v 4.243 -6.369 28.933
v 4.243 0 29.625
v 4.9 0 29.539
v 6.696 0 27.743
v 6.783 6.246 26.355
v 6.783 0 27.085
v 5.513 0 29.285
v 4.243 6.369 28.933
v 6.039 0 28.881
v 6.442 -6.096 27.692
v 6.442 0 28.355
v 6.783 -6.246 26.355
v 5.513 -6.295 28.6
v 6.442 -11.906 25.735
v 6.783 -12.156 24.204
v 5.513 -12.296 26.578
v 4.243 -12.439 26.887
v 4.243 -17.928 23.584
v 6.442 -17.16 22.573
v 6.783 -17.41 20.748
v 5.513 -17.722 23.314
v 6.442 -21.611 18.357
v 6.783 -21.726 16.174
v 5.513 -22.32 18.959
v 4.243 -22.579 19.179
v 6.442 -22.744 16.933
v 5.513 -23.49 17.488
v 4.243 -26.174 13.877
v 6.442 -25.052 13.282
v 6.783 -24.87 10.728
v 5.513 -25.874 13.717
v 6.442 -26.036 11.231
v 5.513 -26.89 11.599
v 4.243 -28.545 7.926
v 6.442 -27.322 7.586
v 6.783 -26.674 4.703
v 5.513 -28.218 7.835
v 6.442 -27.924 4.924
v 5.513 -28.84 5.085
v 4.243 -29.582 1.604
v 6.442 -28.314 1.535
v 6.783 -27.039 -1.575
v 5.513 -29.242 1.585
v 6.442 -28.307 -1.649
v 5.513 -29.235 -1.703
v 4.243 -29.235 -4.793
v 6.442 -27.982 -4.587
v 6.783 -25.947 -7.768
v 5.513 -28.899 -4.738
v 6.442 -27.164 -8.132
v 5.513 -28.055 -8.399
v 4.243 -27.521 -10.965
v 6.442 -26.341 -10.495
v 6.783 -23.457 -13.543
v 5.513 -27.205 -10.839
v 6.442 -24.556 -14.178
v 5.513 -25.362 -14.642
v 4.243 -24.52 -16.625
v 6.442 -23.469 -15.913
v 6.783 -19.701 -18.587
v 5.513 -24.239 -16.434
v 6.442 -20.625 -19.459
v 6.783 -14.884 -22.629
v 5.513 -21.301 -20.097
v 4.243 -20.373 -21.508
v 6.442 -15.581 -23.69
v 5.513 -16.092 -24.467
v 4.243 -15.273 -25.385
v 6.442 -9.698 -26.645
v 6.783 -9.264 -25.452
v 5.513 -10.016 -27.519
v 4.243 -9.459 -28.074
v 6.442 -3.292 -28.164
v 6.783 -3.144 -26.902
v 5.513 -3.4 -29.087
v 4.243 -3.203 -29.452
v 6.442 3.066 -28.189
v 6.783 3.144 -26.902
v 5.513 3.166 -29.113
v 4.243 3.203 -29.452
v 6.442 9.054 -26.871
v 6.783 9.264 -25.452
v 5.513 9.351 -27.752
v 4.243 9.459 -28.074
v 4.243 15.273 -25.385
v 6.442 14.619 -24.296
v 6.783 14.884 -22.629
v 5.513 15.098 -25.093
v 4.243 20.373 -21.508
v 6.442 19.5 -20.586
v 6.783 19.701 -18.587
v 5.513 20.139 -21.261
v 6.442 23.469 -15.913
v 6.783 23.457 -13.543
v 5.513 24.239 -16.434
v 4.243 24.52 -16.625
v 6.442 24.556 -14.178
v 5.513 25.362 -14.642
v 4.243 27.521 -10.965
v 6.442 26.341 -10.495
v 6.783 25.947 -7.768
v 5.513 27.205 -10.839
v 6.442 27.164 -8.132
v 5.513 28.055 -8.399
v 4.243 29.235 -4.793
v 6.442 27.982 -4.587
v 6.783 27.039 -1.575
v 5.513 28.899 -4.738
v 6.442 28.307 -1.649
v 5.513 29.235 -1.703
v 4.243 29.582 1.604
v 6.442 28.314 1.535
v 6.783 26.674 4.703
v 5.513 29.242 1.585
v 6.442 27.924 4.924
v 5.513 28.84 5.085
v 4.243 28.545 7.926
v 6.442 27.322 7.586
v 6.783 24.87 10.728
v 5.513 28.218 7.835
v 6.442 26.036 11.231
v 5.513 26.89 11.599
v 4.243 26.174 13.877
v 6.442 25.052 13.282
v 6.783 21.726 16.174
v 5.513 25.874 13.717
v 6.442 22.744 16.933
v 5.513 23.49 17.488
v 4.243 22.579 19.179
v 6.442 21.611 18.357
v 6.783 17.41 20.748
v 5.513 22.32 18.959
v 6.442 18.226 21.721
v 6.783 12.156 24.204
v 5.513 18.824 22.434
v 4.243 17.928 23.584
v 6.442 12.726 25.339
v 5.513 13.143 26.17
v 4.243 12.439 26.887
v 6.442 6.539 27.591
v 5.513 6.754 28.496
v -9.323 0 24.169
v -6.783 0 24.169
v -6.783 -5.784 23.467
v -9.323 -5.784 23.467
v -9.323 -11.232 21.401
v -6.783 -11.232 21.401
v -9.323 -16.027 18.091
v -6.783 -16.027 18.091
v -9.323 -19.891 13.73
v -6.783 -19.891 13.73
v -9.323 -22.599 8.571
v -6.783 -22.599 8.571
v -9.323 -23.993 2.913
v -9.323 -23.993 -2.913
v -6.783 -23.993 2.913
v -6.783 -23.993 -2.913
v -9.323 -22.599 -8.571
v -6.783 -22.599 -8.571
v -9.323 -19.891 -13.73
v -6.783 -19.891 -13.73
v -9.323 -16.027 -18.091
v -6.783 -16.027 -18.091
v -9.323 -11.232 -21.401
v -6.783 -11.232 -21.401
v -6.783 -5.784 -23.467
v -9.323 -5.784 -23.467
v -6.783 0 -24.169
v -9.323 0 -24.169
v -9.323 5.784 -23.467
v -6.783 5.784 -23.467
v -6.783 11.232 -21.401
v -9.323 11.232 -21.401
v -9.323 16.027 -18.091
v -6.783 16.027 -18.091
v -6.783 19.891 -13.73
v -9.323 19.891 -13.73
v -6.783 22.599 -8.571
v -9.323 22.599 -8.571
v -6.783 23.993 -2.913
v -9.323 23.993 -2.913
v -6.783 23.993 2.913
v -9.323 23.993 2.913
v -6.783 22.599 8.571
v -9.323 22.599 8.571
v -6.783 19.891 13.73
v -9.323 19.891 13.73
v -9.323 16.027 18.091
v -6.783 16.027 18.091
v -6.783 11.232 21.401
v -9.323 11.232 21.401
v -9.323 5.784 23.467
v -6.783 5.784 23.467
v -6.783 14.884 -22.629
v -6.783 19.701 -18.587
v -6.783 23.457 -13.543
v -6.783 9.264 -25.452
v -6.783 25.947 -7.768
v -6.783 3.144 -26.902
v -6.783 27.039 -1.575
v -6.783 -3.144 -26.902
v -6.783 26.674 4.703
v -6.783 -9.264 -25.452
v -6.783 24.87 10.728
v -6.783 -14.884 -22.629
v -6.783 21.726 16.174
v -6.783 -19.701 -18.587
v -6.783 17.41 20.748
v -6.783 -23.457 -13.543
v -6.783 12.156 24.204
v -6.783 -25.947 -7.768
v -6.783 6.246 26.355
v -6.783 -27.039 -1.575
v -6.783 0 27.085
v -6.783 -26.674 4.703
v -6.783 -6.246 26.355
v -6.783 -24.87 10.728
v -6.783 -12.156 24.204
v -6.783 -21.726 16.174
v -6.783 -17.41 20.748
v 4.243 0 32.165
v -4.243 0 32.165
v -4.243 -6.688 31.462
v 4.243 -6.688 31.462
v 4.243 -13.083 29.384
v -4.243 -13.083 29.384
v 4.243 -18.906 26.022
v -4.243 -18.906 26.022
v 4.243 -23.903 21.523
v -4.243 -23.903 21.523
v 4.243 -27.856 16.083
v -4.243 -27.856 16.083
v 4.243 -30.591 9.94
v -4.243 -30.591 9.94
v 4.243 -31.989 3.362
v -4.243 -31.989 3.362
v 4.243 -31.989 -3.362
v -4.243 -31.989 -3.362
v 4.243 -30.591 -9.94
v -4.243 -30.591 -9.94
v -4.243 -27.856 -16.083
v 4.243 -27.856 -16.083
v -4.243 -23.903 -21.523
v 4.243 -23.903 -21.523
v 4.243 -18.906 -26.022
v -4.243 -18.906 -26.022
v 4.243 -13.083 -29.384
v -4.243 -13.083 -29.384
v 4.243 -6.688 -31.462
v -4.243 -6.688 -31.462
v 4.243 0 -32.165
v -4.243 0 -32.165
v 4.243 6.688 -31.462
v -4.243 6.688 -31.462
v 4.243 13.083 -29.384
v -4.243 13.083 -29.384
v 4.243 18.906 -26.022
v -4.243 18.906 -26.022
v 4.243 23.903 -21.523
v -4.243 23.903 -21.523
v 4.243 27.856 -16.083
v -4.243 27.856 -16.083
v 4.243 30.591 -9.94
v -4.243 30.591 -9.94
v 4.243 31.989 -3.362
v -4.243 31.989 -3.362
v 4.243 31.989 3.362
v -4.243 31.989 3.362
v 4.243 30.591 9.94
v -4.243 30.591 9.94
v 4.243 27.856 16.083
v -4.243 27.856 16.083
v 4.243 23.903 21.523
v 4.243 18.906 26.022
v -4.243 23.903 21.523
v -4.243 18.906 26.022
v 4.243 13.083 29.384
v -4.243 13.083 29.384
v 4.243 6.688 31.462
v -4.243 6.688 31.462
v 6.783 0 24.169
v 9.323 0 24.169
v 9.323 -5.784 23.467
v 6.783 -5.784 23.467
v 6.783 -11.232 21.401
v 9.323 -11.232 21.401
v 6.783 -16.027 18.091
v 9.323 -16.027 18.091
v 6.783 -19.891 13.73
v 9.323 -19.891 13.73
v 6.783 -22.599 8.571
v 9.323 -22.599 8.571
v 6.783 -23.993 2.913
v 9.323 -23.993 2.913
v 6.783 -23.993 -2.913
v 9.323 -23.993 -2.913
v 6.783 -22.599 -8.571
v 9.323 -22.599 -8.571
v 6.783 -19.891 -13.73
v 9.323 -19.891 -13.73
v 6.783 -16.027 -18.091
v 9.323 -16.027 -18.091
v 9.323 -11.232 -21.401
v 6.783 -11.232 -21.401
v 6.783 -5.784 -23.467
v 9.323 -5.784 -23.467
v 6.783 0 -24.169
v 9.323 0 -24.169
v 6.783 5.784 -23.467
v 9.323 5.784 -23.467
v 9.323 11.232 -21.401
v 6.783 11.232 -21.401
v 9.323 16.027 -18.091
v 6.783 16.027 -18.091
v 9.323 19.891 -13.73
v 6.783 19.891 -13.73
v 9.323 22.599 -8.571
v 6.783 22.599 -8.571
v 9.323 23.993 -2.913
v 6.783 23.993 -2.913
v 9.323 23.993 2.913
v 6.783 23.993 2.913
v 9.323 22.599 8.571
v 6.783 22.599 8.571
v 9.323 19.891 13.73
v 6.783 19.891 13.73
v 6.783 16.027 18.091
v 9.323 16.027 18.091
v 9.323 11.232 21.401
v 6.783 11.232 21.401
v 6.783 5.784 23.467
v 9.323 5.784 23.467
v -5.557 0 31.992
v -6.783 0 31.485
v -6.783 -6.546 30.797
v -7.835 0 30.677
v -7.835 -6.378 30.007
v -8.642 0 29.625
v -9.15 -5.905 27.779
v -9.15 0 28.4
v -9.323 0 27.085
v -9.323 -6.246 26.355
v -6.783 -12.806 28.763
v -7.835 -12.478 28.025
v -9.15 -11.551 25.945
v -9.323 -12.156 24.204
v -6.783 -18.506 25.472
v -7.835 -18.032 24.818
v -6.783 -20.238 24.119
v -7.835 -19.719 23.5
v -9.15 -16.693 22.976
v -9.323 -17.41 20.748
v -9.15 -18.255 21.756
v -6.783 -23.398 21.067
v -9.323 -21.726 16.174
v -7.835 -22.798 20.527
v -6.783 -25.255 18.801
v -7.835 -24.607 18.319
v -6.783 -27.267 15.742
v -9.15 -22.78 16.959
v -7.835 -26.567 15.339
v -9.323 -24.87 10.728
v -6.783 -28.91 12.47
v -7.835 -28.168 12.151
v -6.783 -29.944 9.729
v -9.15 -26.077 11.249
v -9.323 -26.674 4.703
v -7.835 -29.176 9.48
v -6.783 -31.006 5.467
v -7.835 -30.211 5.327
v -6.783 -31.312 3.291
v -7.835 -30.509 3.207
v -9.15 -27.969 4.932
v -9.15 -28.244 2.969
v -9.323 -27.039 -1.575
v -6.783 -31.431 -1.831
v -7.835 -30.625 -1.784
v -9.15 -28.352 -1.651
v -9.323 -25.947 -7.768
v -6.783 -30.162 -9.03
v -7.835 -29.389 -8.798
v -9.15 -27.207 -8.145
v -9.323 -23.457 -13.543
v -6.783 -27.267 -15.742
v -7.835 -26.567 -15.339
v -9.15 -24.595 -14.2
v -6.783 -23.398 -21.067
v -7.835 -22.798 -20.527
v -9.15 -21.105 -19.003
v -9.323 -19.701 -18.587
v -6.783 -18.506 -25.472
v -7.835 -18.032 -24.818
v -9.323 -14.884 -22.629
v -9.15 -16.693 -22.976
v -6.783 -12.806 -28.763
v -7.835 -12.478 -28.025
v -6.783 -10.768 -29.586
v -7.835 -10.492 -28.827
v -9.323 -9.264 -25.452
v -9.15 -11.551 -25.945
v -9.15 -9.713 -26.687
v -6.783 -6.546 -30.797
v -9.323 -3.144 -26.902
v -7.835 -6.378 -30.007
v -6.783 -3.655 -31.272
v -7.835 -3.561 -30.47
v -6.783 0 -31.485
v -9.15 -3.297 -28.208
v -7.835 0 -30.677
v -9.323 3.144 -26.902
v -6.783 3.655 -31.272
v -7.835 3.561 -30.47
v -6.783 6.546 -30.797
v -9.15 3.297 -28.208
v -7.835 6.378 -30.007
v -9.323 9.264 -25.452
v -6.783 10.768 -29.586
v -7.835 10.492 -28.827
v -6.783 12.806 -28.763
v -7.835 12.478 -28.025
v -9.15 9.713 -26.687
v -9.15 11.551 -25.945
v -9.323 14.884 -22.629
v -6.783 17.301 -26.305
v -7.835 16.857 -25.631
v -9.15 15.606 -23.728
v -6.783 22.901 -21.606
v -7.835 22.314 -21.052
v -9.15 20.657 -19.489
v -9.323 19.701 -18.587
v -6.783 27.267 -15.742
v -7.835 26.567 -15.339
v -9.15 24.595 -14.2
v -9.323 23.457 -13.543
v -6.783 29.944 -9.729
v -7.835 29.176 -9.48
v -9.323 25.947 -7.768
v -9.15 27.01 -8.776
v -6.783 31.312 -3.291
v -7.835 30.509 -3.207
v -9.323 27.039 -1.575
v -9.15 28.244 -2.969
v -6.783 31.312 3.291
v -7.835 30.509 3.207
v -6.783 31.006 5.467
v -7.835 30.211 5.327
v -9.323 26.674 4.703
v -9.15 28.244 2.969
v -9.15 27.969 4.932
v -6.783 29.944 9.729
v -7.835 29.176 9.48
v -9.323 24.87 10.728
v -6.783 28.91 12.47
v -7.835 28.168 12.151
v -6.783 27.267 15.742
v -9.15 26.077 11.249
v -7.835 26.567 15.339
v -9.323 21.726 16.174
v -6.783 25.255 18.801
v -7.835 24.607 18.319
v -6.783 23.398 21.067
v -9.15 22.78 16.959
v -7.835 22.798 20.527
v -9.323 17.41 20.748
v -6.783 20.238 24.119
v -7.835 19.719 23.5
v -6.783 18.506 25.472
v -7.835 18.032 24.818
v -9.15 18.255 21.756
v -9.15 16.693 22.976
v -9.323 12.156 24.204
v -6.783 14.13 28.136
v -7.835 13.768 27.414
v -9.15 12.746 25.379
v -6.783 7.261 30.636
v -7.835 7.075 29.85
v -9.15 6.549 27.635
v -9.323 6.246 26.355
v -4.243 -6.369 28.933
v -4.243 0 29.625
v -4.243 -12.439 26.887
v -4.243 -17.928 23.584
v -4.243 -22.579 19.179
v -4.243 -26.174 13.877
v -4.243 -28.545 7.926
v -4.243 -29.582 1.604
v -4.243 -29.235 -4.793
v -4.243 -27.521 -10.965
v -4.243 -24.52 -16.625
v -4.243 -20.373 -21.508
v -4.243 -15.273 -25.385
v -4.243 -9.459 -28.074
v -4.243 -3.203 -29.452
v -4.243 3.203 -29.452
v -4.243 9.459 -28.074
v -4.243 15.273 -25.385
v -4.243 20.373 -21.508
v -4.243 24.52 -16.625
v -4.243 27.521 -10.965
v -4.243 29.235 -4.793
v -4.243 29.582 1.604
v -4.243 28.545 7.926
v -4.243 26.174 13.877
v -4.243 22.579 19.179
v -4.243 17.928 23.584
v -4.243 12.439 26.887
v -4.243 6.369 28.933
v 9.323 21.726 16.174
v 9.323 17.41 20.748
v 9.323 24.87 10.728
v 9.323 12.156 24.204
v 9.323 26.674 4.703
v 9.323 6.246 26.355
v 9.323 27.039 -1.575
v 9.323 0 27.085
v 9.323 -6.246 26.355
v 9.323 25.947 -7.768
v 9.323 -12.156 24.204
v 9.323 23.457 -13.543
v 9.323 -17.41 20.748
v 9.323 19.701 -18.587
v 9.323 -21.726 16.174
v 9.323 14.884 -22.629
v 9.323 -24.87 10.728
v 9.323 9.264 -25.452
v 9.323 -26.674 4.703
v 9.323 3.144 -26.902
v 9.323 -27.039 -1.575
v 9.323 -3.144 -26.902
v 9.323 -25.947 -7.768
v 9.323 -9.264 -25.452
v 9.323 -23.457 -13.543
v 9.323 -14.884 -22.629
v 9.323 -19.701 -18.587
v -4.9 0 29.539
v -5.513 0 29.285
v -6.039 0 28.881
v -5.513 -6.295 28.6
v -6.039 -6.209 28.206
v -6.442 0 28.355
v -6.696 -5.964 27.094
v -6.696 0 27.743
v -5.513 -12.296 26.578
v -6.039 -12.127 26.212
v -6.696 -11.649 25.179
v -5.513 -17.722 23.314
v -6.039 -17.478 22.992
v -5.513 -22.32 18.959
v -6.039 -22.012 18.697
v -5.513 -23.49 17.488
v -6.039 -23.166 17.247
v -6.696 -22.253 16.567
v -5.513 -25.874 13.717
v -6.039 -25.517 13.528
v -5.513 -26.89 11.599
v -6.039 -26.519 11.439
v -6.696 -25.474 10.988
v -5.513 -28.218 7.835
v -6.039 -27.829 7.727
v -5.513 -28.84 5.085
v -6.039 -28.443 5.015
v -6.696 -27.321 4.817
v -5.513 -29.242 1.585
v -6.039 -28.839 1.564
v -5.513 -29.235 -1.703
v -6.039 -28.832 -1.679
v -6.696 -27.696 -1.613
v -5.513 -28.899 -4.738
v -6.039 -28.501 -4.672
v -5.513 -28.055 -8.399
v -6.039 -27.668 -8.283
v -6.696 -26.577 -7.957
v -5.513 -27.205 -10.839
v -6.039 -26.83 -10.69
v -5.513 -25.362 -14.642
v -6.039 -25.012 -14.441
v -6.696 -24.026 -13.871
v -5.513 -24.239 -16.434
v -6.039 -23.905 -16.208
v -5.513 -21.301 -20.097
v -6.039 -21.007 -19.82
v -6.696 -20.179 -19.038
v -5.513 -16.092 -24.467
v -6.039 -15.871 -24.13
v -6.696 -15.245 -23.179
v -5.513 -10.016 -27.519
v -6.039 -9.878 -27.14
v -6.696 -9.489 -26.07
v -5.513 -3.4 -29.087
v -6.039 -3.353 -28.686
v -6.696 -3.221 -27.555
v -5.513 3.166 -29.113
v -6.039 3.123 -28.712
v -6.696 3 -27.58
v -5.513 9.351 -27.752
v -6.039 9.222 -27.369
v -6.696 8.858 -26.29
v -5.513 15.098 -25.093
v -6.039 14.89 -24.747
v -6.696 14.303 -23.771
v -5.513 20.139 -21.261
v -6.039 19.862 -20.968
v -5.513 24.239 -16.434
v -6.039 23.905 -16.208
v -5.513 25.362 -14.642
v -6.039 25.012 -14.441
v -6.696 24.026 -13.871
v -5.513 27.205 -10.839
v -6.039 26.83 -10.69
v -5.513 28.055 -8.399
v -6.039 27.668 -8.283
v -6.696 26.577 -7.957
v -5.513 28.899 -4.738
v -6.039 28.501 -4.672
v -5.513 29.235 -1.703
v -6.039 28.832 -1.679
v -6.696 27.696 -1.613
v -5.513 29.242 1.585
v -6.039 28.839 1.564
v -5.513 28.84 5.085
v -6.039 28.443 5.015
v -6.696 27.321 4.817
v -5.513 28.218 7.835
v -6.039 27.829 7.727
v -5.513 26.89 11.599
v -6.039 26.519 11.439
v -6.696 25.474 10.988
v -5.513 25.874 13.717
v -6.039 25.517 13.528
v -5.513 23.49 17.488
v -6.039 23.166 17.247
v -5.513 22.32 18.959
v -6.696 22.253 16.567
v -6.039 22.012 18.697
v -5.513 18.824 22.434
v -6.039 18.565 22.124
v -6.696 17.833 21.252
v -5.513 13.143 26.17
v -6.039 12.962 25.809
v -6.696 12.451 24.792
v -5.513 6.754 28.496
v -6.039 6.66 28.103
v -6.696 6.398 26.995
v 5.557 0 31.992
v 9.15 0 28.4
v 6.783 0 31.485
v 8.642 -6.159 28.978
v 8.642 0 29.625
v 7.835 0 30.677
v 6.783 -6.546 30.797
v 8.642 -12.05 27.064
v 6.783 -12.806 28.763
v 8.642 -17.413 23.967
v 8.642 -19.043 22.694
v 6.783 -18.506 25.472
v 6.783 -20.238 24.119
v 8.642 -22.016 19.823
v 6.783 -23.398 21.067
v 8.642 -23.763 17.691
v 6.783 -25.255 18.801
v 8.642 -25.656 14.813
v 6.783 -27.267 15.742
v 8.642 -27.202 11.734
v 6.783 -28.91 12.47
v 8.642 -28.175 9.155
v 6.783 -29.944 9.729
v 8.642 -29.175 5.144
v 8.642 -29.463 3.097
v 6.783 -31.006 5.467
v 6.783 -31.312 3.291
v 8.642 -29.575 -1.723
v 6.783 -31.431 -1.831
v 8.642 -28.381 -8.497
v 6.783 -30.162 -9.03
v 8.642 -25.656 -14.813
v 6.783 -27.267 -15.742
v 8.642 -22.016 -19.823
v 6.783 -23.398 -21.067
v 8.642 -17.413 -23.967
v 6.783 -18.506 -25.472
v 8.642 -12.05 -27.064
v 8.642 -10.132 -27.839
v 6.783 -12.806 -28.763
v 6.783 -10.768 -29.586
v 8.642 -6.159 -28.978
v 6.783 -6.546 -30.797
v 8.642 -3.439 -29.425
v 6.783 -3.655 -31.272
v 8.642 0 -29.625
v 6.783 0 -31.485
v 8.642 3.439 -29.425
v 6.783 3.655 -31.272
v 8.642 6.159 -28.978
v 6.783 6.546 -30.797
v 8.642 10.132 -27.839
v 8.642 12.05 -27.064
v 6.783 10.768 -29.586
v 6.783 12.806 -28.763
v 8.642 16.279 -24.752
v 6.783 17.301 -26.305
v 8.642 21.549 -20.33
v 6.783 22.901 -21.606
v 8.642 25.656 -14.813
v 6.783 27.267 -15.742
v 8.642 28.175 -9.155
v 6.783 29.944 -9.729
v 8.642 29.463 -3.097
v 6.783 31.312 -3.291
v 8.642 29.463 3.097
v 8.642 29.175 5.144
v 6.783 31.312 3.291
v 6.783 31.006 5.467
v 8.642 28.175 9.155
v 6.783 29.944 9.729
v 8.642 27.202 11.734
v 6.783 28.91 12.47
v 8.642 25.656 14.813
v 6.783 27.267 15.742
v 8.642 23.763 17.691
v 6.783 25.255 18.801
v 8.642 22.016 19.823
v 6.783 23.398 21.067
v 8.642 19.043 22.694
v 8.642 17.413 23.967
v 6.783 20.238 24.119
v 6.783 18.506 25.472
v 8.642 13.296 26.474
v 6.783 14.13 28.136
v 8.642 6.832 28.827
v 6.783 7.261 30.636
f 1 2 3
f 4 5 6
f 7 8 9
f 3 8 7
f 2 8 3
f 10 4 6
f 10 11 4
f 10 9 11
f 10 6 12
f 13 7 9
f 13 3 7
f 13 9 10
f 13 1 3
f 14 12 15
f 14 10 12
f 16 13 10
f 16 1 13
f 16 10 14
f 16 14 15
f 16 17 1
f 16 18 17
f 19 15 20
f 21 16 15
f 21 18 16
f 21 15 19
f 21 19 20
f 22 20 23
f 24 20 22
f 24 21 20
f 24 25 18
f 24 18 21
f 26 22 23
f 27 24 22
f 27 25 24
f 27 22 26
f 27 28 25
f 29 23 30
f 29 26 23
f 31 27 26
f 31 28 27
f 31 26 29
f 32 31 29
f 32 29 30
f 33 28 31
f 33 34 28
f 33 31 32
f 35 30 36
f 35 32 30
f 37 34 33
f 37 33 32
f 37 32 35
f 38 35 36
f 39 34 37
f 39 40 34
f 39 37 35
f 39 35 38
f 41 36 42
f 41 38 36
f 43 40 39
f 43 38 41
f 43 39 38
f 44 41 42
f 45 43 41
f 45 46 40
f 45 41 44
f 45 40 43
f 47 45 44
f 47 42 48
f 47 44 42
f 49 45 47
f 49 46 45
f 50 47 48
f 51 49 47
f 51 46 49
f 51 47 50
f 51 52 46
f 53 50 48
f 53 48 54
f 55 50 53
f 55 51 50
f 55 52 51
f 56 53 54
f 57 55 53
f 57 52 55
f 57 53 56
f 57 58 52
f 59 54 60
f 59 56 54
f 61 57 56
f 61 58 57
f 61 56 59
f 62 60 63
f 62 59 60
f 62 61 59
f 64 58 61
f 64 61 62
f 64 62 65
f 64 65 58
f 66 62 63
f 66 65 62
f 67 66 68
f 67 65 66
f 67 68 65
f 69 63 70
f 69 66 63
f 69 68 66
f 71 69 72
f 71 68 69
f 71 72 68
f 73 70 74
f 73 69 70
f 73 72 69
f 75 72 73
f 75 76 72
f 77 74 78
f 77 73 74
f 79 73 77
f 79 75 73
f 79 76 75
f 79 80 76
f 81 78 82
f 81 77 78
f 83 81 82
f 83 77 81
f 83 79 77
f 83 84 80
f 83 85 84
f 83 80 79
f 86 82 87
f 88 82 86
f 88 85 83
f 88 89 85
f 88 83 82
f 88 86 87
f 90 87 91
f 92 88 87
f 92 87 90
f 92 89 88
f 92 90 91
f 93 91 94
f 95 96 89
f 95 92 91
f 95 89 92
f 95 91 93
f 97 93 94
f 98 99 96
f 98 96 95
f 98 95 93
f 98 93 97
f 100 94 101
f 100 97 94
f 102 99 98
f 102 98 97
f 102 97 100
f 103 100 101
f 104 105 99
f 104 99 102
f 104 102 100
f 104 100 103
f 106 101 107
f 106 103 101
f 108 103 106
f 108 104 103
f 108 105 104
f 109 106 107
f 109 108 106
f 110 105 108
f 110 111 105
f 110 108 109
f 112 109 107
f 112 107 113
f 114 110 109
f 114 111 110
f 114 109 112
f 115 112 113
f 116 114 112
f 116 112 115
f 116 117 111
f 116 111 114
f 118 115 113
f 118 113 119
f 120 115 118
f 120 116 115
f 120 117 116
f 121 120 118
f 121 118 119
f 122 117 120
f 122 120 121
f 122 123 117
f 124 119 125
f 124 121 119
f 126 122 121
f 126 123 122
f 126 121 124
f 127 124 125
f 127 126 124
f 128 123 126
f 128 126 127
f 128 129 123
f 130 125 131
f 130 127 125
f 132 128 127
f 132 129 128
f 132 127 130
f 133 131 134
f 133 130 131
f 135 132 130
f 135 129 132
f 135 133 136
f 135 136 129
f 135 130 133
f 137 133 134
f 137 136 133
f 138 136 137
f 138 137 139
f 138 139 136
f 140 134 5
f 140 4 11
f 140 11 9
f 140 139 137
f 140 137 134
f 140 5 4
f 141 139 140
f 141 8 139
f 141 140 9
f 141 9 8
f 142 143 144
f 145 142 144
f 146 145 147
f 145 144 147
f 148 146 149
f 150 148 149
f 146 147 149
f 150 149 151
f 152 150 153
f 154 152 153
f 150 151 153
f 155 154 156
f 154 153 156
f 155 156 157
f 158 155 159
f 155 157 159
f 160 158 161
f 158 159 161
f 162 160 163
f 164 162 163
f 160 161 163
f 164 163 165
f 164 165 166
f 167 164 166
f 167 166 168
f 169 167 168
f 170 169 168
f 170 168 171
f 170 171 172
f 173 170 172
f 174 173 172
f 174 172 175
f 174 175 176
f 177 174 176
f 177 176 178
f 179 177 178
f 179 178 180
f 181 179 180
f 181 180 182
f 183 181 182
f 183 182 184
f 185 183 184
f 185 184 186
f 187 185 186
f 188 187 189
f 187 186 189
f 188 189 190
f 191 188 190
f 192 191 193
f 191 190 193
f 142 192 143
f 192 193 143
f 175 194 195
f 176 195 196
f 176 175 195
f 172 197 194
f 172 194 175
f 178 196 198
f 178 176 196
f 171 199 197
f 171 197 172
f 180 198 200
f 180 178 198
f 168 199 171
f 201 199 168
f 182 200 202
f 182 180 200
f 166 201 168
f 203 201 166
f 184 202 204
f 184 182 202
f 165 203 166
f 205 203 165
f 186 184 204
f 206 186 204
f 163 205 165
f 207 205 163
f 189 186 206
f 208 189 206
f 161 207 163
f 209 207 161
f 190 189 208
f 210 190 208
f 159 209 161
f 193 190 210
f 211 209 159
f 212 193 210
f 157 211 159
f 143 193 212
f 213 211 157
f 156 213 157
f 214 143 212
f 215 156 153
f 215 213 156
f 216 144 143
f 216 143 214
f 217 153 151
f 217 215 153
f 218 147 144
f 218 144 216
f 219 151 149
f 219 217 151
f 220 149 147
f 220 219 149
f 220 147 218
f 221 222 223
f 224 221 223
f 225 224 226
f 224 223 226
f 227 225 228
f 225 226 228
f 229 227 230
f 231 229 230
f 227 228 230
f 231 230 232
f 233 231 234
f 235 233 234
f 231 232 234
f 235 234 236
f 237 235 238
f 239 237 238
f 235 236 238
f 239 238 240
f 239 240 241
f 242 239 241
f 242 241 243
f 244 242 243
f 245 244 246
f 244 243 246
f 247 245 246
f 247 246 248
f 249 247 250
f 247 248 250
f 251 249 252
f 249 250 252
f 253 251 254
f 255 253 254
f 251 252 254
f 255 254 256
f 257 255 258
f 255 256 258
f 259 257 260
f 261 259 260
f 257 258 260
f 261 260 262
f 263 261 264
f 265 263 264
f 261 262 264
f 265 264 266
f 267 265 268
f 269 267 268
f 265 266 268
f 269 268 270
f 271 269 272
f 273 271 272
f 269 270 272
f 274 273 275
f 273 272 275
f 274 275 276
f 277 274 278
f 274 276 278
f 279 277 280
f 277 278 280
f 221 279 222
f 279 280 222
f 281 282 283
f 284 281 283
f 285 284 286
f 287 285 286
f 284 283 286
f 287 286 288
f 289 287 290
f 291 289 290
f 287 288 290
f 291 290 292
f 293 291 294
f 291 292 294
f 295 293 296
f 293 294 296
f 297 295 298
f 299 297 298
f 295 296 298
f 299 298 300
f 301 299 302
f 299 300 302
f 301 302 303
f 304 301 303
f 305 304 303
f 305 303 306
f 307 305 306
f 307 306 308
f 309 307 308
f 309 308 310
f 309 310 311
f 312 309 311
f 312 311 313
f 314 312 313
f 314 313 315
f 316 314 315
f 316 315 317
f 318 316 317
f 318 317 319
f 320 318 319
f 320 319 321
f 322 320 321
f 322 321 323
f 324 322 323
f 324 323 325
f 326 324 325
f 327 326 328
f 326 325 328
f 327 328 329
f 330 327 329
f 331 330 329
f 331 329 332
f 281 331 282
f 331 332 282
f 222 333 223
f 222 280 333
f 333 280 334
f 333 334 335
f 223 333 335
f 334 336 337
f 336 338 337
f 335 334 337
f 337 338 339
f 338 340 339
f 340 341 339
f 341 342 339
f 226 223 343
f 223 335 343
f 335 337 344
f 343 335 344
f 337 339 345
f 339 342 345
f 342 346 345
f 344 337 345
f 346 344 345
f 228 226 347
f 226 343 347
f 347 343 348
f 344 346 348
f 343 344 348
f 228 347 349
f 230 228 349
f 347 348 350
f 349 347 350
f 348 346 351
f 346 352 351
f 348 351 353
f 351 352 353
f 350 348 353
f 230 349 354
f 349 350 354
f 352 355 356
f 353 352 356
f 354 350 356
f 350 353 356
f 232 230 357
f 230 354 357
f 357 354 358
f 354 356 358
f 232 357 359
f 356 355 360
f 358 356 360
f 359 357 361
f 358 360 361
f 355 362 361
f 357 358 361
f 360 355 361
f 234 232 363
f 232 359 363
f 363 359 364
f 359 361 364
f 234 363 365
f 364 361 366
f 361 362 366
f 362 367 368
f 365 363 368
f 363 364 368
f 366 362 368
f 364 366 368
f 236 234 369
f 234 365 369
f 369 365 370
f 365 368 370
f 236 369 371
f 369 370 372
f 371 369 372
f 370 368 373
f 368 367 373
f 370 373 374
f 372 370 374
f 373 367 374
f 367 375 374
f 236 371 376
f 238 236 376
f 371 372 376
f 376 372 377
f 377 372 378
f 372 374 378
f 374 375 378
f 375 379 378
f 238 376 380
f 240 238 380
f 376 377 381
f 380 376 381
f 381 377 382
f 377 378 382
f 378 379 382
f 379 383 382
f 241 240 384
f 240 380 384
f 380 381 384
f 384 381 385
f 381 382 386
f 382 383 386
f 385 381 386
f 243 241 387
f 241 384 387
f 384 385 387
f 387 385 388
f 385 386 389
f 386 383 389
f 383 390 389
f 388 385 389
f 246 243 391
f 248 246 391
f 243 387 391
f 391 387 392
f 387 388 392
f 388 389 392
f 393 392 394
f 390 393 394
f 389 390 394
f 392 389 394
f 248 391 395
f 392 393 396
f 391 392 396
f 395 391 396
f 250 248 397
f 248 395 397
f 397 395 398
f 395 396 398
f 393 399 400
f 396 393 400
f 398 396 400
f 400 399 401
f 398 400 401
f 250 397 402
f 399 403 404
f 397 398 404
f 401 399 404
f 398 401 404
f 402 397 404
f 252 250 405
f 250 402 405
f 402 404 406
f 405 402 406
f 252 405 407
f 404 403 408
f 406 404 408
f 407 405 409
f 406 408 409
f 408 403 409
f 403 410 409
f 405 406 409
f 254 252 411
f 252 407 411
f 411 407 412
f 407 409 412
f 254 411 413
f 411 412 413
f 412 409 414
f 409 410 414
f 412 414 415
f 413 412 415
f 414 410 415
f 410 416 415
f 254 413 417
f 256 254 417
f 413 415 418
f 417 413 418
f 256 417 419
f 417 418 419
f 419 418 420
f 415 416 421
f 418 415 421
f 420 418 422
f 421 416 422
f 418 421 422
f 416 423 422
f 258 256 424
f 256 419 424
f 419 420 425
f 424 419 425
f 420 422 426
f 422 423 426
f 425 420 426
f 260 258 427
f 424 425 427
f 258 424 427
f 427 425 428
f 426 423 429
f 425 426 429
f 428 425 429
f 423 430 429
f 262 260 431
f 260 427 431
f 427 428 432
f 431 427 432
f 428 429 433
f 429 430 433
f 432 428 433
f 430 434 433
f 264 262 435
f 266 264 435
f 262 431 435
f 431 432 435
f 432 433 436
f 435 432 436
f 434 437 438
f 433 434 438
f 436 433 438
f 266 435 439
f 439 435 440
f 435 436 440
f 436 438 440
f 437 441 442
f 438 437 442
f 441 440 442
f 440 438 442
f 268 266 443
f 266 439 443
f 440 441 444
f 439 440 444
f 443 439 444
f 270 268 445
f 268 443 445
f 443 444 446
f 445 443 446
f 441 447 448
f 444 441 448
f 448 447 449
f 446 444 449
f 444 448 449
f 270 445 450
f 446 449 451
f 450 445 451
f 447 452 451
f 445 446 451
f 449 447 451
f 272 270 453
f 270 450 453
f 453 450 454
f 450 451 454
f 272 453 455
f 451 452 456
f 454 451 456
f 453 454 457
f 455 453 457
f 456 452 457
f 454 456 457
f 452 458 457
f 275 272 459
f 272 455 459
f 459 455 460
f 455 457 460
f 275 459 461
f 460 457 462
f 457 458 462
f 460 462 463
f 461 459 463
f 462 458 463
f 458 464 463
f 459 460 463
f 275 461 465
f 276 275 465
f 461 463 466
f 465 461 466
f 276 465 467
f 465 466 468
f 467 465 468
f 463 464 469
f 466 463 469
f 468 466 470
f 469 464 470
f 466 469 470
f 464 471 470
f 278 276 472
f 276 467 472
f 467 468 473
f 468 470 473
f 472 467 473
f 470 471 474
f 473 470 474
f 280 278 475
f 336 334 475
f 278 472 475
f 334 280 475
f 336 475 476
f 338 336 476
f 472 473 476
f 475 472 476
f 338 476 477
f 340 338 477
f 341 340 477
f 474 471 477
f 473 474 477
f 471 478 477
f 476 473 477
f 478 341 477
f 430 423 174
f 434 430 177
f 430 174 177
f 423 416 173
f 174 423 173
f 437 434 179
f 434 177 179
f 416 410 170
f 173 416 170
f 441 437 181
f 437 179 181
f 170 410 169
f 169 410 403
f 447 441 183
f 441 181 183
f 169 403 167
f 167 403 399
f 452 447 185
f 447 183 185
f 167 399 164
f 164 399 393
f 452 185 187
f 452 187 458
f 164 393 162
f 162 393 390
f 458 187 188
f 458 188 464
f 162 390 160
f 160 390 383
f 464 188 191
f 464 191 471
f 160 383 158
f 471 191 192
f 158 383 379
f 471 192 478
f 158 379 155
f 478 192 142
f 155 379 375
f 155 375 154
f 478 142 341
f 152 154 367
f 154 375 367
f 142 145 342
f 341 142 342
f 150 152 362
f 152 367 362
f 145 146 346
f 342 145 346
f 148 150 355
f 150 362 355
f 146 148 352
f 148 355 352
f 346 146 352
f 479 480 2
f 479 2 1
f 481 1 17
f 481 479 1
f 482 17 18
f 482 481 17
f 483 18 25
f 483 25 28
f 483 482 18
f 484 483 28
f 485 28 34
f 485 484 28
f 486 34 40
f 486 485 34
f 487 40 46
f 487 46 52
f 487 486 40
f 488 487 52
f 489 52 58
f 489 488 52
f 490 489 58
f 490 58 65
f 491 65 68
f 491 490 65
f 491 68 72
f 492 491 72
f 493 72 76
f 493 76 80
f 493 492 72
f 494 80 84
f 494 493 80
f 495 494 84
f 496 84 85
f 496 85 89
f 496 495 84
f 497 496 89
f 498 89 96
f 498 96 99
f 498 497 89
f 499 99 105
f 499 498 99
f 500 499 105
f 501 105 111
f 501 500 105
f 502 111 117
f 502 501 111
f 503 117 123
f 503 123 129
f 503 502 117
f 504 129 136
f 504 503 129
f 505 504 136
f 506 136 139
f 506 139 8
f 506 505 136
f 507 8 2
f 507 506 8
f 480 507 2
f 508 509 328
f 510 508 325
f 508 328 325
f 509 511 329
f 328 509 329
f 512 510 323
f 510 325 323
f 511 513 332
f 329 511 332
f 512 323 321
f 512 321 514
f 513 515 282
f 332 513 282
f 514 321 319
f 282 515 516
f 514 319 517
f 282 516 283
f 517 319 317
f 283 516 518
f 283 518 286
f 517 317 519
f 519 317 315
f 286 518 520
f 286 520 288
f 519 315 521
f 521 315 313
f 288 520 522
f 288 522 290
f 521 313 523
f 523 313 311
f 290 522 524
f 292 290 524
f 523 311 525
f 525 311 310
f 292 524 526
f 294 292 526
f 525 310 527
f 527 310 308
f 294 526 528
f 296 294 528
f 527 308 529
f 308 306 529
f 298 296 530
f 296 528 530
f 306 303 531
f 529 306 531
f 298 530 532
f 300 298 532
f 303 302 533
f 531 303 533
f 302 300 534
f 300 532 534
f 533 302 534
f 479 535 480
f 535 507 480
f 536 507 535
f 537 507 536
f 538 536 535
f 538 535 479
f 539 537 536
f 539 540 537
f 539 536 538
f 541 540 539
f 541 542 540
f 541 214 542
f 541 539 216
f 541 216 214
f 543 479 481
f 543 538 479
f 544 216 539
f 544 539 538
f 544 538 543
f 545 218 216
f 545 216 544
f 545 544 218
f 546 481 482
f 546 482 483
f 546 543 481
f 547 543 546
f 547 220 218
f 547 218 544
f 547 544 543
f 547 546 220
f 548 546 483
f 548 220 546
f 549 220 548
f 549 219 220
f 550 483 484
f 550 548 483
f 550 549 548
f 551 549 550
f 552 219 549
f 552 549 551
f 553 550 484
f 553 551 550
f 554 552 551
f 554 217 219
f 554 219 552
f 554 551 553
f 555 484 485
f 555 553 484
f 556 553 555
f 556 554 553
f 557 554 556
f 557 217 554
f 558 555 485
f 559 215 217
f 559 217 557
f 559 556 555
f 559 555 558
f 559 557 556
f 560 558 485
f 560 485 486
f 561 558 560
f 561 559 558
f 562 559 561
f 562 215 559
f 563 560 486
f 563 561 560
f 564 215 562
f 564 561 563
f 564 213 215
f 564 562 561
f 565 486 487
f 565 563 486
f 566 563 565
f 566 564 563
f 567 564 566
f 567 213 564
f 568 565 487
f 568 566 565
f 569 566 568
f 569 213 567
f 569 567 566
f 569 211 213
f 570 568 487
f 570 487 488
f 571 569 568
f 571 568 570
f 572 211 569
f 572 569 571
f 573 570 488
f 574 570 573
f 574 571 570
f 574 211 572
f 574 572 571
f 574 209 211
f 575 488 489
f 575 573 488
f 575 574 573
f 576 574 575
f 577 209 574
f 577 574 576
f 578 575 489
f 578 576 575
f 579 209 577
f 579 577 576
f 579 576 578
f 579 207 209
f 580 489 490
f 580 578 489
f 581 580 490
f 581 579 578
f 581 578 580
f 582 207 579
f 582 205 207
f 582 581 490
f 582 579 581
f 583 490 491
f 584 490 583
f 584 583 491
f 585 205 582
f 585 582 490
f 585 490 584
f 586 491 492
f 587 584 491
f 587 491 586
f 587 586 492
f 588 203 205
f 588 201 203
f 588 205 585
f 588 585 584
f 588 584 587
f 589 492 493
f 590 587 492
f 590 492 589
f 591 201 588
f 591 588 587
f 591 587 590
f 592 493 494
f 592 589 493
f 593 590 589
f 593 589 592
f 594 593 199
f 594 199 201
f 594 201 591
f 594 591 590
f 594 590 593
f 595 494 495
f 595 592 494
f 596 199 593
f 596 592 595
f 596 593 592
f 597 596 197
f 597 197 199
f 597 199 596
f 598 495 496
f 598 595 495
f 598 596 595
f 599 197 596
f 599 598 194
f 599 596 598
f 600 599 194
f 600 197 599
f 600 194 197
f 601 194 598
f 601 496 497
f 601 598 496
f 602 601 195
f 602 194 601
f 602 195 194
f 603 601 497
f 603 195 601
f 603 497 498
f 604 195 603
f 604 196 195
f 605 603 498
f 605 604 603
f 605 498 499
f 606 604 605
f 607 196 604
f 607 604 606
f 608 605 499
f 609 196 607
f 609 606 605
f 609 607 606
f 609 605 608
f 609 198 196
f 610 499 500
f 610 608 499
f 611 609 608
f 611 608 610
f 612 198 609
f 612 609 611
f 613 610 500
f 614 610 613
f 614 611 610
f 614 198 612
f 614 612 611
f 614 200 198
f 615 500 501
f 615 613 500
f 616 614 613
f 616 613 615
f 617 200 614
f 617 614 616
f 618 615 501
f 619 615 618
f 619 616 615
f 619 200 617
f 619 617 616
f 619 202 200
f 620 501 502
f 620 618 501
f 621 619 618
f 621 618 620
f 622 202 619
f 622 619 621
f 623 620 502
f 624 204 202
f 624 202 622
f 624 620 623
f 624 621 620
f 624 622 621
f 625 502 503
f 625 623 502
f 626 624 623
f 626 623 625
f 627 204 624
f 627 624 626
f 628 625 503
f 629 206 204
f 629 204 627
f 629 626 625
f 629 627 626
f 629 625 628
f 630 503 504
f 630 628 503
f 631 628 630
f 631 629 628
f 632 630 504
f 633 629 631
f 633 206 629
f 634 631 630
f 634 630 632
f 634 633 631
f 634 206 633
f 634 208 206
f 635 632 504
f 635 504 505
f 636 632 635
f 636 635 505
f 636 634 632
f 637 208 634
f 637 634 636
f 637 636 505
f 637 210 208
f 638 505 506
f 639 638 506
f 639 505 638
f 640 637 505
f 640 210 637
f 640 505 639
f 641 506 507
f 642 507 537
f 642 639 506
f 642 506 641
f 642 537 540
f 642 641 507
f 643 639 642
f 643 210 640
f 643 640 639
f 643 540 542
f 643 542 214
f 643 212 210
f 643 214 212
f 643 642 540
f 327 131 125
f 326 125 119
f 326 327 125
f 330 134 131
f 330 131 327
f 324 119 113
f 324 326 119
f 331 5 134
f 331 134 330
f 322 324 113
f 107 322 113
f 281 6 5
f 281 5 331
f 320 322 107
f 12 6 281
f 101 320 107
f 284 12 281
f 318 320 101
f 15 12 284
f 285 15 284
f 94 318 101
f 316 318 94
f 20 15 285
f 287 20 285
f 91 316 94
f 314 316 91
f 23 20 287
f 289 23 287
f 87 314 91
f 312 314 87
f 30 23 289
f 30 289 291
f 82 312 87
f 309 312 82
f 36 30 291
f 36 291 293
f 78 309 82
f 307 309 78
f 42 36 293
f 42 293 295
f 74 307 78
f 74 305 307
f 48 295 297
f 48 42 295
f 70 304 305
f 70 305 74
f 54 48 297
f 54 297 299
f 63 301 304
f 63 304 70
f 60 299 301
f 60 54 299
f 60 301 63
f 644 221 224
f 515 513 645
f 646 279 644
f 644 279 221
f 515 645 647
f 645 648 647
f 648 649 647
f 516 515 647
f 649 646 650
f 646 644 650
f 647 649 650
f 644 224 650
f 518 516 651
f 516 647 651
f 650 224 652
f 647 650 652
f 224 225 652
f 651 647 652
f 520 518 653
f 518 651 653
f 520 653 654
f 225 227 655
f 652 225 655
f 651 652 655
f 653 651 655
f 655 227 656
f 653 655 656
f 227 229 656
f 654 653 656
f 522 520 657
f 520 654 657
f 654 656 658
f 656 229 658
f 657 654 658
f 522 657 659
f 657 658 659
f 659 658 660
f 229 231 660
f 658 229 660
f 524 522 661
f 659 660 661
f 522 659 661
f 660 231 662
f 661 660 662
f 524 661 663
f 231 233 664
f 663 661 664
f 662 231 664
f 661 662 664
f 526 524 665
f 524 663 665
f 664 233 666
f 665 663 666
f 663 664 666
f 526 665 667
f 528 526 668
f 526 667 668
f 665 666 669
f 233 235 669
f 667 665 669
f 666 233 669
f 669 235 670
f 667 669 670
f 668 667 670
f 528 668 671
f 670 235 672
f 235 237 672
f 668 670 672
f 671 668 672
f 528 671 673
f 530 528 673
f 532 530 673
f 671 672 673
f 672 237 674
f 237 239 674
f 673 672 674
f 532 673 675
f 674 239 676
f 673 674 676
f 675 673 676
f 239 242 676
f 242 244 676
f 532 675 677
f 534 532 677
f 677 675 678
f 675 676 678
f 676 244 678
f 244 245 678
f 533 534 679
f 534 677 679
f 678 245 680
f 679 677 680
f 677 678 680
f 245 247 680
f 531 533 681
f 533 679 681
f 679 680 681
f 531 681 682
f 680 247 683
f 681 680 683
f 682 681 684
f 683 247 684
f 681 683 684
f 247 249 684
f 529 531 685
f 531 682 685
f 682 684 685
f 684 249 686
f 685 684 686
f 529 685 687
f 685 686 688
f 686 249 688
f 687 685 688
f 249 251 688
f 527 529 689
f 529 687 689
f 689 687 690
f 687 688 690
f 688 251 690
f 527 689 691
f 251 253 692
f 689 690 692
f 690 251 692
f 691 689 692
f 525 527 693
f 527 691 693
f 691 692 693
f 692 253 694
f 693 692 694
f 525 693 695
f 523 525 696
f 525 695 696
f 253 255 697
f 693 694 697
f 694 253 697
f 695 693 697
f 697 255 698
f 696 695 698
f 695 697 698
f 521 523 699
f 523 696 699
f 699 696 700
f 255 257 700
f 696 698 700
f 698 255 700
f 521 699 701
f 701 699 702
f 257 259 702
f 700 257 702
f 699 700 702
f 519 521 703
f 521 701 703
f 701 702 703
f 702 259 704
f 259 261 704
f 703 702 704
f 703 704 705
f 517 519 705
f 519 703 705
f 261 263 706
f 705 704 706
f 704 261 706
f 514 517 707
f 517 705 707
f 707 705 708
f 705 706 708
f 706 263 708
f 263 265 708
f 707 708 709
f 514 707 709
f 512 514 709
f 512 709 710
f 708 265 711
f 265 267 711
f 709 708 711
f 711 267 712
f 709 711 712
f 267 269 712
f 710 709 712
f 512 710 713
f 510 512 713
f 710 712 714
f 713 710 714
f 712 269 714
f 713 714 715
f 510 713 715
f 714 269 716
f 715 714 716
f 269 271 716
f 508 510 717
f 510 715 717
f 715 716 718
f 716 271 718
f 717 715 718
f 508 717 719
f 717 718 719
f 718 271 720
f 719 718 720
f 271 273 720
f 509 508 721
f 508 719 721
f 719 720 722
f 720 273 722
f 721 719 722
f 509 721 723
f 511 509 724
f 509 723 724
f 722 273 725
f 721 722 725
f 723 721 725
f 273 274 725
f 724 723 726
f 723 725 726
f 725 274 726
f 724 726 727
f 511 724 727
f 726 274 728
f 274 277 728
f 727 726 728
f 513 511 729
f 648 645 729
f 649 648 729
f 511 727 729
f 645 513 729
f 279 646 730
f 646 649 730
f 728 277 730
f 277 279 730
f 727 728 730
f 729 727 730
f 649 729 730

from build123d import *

# Parameters (mm, degrees)
F2_R = 5.08
F3_R = 5.08
F4_T = -2.54


with BuildPart() as f1:
    # F0 (on Front) → F1 (revolve)
    with BuildSketch(Plane.XZ):
        Polygon((0, 32.165237), (-9.322633, 32.165237), (-9.322633, 24.169475), (0, 24.169475), (9.322633, 24.169475), (9.322633, 32.165237), align=None)
    revolve(axis=Axis((0.987695, 0, 0), (1, 0, 0)))

    # F2
    f2_edges = [f1.edges().sort_by_distance(p)[0] for p in [
        (9.322633, 0, -32.165237),
    ]]
    fillet(f2_edges, radius=F2_R)

    # F3
    f3_edges = [f1.edges().sort_by_distance(p)[0] for p in [
        (-9.322633, 0, -32.165237),
    ]]
    fillet(f3_edges, radius=F3_R)

    # F4
    f4_openings = [f1.faces().sort_by_distance(p)[0] for p in [
        (0, 0, -24.169475),
    ]]
    offset(amount=F4_T, openings=f4_openings)


solid = f1.part
